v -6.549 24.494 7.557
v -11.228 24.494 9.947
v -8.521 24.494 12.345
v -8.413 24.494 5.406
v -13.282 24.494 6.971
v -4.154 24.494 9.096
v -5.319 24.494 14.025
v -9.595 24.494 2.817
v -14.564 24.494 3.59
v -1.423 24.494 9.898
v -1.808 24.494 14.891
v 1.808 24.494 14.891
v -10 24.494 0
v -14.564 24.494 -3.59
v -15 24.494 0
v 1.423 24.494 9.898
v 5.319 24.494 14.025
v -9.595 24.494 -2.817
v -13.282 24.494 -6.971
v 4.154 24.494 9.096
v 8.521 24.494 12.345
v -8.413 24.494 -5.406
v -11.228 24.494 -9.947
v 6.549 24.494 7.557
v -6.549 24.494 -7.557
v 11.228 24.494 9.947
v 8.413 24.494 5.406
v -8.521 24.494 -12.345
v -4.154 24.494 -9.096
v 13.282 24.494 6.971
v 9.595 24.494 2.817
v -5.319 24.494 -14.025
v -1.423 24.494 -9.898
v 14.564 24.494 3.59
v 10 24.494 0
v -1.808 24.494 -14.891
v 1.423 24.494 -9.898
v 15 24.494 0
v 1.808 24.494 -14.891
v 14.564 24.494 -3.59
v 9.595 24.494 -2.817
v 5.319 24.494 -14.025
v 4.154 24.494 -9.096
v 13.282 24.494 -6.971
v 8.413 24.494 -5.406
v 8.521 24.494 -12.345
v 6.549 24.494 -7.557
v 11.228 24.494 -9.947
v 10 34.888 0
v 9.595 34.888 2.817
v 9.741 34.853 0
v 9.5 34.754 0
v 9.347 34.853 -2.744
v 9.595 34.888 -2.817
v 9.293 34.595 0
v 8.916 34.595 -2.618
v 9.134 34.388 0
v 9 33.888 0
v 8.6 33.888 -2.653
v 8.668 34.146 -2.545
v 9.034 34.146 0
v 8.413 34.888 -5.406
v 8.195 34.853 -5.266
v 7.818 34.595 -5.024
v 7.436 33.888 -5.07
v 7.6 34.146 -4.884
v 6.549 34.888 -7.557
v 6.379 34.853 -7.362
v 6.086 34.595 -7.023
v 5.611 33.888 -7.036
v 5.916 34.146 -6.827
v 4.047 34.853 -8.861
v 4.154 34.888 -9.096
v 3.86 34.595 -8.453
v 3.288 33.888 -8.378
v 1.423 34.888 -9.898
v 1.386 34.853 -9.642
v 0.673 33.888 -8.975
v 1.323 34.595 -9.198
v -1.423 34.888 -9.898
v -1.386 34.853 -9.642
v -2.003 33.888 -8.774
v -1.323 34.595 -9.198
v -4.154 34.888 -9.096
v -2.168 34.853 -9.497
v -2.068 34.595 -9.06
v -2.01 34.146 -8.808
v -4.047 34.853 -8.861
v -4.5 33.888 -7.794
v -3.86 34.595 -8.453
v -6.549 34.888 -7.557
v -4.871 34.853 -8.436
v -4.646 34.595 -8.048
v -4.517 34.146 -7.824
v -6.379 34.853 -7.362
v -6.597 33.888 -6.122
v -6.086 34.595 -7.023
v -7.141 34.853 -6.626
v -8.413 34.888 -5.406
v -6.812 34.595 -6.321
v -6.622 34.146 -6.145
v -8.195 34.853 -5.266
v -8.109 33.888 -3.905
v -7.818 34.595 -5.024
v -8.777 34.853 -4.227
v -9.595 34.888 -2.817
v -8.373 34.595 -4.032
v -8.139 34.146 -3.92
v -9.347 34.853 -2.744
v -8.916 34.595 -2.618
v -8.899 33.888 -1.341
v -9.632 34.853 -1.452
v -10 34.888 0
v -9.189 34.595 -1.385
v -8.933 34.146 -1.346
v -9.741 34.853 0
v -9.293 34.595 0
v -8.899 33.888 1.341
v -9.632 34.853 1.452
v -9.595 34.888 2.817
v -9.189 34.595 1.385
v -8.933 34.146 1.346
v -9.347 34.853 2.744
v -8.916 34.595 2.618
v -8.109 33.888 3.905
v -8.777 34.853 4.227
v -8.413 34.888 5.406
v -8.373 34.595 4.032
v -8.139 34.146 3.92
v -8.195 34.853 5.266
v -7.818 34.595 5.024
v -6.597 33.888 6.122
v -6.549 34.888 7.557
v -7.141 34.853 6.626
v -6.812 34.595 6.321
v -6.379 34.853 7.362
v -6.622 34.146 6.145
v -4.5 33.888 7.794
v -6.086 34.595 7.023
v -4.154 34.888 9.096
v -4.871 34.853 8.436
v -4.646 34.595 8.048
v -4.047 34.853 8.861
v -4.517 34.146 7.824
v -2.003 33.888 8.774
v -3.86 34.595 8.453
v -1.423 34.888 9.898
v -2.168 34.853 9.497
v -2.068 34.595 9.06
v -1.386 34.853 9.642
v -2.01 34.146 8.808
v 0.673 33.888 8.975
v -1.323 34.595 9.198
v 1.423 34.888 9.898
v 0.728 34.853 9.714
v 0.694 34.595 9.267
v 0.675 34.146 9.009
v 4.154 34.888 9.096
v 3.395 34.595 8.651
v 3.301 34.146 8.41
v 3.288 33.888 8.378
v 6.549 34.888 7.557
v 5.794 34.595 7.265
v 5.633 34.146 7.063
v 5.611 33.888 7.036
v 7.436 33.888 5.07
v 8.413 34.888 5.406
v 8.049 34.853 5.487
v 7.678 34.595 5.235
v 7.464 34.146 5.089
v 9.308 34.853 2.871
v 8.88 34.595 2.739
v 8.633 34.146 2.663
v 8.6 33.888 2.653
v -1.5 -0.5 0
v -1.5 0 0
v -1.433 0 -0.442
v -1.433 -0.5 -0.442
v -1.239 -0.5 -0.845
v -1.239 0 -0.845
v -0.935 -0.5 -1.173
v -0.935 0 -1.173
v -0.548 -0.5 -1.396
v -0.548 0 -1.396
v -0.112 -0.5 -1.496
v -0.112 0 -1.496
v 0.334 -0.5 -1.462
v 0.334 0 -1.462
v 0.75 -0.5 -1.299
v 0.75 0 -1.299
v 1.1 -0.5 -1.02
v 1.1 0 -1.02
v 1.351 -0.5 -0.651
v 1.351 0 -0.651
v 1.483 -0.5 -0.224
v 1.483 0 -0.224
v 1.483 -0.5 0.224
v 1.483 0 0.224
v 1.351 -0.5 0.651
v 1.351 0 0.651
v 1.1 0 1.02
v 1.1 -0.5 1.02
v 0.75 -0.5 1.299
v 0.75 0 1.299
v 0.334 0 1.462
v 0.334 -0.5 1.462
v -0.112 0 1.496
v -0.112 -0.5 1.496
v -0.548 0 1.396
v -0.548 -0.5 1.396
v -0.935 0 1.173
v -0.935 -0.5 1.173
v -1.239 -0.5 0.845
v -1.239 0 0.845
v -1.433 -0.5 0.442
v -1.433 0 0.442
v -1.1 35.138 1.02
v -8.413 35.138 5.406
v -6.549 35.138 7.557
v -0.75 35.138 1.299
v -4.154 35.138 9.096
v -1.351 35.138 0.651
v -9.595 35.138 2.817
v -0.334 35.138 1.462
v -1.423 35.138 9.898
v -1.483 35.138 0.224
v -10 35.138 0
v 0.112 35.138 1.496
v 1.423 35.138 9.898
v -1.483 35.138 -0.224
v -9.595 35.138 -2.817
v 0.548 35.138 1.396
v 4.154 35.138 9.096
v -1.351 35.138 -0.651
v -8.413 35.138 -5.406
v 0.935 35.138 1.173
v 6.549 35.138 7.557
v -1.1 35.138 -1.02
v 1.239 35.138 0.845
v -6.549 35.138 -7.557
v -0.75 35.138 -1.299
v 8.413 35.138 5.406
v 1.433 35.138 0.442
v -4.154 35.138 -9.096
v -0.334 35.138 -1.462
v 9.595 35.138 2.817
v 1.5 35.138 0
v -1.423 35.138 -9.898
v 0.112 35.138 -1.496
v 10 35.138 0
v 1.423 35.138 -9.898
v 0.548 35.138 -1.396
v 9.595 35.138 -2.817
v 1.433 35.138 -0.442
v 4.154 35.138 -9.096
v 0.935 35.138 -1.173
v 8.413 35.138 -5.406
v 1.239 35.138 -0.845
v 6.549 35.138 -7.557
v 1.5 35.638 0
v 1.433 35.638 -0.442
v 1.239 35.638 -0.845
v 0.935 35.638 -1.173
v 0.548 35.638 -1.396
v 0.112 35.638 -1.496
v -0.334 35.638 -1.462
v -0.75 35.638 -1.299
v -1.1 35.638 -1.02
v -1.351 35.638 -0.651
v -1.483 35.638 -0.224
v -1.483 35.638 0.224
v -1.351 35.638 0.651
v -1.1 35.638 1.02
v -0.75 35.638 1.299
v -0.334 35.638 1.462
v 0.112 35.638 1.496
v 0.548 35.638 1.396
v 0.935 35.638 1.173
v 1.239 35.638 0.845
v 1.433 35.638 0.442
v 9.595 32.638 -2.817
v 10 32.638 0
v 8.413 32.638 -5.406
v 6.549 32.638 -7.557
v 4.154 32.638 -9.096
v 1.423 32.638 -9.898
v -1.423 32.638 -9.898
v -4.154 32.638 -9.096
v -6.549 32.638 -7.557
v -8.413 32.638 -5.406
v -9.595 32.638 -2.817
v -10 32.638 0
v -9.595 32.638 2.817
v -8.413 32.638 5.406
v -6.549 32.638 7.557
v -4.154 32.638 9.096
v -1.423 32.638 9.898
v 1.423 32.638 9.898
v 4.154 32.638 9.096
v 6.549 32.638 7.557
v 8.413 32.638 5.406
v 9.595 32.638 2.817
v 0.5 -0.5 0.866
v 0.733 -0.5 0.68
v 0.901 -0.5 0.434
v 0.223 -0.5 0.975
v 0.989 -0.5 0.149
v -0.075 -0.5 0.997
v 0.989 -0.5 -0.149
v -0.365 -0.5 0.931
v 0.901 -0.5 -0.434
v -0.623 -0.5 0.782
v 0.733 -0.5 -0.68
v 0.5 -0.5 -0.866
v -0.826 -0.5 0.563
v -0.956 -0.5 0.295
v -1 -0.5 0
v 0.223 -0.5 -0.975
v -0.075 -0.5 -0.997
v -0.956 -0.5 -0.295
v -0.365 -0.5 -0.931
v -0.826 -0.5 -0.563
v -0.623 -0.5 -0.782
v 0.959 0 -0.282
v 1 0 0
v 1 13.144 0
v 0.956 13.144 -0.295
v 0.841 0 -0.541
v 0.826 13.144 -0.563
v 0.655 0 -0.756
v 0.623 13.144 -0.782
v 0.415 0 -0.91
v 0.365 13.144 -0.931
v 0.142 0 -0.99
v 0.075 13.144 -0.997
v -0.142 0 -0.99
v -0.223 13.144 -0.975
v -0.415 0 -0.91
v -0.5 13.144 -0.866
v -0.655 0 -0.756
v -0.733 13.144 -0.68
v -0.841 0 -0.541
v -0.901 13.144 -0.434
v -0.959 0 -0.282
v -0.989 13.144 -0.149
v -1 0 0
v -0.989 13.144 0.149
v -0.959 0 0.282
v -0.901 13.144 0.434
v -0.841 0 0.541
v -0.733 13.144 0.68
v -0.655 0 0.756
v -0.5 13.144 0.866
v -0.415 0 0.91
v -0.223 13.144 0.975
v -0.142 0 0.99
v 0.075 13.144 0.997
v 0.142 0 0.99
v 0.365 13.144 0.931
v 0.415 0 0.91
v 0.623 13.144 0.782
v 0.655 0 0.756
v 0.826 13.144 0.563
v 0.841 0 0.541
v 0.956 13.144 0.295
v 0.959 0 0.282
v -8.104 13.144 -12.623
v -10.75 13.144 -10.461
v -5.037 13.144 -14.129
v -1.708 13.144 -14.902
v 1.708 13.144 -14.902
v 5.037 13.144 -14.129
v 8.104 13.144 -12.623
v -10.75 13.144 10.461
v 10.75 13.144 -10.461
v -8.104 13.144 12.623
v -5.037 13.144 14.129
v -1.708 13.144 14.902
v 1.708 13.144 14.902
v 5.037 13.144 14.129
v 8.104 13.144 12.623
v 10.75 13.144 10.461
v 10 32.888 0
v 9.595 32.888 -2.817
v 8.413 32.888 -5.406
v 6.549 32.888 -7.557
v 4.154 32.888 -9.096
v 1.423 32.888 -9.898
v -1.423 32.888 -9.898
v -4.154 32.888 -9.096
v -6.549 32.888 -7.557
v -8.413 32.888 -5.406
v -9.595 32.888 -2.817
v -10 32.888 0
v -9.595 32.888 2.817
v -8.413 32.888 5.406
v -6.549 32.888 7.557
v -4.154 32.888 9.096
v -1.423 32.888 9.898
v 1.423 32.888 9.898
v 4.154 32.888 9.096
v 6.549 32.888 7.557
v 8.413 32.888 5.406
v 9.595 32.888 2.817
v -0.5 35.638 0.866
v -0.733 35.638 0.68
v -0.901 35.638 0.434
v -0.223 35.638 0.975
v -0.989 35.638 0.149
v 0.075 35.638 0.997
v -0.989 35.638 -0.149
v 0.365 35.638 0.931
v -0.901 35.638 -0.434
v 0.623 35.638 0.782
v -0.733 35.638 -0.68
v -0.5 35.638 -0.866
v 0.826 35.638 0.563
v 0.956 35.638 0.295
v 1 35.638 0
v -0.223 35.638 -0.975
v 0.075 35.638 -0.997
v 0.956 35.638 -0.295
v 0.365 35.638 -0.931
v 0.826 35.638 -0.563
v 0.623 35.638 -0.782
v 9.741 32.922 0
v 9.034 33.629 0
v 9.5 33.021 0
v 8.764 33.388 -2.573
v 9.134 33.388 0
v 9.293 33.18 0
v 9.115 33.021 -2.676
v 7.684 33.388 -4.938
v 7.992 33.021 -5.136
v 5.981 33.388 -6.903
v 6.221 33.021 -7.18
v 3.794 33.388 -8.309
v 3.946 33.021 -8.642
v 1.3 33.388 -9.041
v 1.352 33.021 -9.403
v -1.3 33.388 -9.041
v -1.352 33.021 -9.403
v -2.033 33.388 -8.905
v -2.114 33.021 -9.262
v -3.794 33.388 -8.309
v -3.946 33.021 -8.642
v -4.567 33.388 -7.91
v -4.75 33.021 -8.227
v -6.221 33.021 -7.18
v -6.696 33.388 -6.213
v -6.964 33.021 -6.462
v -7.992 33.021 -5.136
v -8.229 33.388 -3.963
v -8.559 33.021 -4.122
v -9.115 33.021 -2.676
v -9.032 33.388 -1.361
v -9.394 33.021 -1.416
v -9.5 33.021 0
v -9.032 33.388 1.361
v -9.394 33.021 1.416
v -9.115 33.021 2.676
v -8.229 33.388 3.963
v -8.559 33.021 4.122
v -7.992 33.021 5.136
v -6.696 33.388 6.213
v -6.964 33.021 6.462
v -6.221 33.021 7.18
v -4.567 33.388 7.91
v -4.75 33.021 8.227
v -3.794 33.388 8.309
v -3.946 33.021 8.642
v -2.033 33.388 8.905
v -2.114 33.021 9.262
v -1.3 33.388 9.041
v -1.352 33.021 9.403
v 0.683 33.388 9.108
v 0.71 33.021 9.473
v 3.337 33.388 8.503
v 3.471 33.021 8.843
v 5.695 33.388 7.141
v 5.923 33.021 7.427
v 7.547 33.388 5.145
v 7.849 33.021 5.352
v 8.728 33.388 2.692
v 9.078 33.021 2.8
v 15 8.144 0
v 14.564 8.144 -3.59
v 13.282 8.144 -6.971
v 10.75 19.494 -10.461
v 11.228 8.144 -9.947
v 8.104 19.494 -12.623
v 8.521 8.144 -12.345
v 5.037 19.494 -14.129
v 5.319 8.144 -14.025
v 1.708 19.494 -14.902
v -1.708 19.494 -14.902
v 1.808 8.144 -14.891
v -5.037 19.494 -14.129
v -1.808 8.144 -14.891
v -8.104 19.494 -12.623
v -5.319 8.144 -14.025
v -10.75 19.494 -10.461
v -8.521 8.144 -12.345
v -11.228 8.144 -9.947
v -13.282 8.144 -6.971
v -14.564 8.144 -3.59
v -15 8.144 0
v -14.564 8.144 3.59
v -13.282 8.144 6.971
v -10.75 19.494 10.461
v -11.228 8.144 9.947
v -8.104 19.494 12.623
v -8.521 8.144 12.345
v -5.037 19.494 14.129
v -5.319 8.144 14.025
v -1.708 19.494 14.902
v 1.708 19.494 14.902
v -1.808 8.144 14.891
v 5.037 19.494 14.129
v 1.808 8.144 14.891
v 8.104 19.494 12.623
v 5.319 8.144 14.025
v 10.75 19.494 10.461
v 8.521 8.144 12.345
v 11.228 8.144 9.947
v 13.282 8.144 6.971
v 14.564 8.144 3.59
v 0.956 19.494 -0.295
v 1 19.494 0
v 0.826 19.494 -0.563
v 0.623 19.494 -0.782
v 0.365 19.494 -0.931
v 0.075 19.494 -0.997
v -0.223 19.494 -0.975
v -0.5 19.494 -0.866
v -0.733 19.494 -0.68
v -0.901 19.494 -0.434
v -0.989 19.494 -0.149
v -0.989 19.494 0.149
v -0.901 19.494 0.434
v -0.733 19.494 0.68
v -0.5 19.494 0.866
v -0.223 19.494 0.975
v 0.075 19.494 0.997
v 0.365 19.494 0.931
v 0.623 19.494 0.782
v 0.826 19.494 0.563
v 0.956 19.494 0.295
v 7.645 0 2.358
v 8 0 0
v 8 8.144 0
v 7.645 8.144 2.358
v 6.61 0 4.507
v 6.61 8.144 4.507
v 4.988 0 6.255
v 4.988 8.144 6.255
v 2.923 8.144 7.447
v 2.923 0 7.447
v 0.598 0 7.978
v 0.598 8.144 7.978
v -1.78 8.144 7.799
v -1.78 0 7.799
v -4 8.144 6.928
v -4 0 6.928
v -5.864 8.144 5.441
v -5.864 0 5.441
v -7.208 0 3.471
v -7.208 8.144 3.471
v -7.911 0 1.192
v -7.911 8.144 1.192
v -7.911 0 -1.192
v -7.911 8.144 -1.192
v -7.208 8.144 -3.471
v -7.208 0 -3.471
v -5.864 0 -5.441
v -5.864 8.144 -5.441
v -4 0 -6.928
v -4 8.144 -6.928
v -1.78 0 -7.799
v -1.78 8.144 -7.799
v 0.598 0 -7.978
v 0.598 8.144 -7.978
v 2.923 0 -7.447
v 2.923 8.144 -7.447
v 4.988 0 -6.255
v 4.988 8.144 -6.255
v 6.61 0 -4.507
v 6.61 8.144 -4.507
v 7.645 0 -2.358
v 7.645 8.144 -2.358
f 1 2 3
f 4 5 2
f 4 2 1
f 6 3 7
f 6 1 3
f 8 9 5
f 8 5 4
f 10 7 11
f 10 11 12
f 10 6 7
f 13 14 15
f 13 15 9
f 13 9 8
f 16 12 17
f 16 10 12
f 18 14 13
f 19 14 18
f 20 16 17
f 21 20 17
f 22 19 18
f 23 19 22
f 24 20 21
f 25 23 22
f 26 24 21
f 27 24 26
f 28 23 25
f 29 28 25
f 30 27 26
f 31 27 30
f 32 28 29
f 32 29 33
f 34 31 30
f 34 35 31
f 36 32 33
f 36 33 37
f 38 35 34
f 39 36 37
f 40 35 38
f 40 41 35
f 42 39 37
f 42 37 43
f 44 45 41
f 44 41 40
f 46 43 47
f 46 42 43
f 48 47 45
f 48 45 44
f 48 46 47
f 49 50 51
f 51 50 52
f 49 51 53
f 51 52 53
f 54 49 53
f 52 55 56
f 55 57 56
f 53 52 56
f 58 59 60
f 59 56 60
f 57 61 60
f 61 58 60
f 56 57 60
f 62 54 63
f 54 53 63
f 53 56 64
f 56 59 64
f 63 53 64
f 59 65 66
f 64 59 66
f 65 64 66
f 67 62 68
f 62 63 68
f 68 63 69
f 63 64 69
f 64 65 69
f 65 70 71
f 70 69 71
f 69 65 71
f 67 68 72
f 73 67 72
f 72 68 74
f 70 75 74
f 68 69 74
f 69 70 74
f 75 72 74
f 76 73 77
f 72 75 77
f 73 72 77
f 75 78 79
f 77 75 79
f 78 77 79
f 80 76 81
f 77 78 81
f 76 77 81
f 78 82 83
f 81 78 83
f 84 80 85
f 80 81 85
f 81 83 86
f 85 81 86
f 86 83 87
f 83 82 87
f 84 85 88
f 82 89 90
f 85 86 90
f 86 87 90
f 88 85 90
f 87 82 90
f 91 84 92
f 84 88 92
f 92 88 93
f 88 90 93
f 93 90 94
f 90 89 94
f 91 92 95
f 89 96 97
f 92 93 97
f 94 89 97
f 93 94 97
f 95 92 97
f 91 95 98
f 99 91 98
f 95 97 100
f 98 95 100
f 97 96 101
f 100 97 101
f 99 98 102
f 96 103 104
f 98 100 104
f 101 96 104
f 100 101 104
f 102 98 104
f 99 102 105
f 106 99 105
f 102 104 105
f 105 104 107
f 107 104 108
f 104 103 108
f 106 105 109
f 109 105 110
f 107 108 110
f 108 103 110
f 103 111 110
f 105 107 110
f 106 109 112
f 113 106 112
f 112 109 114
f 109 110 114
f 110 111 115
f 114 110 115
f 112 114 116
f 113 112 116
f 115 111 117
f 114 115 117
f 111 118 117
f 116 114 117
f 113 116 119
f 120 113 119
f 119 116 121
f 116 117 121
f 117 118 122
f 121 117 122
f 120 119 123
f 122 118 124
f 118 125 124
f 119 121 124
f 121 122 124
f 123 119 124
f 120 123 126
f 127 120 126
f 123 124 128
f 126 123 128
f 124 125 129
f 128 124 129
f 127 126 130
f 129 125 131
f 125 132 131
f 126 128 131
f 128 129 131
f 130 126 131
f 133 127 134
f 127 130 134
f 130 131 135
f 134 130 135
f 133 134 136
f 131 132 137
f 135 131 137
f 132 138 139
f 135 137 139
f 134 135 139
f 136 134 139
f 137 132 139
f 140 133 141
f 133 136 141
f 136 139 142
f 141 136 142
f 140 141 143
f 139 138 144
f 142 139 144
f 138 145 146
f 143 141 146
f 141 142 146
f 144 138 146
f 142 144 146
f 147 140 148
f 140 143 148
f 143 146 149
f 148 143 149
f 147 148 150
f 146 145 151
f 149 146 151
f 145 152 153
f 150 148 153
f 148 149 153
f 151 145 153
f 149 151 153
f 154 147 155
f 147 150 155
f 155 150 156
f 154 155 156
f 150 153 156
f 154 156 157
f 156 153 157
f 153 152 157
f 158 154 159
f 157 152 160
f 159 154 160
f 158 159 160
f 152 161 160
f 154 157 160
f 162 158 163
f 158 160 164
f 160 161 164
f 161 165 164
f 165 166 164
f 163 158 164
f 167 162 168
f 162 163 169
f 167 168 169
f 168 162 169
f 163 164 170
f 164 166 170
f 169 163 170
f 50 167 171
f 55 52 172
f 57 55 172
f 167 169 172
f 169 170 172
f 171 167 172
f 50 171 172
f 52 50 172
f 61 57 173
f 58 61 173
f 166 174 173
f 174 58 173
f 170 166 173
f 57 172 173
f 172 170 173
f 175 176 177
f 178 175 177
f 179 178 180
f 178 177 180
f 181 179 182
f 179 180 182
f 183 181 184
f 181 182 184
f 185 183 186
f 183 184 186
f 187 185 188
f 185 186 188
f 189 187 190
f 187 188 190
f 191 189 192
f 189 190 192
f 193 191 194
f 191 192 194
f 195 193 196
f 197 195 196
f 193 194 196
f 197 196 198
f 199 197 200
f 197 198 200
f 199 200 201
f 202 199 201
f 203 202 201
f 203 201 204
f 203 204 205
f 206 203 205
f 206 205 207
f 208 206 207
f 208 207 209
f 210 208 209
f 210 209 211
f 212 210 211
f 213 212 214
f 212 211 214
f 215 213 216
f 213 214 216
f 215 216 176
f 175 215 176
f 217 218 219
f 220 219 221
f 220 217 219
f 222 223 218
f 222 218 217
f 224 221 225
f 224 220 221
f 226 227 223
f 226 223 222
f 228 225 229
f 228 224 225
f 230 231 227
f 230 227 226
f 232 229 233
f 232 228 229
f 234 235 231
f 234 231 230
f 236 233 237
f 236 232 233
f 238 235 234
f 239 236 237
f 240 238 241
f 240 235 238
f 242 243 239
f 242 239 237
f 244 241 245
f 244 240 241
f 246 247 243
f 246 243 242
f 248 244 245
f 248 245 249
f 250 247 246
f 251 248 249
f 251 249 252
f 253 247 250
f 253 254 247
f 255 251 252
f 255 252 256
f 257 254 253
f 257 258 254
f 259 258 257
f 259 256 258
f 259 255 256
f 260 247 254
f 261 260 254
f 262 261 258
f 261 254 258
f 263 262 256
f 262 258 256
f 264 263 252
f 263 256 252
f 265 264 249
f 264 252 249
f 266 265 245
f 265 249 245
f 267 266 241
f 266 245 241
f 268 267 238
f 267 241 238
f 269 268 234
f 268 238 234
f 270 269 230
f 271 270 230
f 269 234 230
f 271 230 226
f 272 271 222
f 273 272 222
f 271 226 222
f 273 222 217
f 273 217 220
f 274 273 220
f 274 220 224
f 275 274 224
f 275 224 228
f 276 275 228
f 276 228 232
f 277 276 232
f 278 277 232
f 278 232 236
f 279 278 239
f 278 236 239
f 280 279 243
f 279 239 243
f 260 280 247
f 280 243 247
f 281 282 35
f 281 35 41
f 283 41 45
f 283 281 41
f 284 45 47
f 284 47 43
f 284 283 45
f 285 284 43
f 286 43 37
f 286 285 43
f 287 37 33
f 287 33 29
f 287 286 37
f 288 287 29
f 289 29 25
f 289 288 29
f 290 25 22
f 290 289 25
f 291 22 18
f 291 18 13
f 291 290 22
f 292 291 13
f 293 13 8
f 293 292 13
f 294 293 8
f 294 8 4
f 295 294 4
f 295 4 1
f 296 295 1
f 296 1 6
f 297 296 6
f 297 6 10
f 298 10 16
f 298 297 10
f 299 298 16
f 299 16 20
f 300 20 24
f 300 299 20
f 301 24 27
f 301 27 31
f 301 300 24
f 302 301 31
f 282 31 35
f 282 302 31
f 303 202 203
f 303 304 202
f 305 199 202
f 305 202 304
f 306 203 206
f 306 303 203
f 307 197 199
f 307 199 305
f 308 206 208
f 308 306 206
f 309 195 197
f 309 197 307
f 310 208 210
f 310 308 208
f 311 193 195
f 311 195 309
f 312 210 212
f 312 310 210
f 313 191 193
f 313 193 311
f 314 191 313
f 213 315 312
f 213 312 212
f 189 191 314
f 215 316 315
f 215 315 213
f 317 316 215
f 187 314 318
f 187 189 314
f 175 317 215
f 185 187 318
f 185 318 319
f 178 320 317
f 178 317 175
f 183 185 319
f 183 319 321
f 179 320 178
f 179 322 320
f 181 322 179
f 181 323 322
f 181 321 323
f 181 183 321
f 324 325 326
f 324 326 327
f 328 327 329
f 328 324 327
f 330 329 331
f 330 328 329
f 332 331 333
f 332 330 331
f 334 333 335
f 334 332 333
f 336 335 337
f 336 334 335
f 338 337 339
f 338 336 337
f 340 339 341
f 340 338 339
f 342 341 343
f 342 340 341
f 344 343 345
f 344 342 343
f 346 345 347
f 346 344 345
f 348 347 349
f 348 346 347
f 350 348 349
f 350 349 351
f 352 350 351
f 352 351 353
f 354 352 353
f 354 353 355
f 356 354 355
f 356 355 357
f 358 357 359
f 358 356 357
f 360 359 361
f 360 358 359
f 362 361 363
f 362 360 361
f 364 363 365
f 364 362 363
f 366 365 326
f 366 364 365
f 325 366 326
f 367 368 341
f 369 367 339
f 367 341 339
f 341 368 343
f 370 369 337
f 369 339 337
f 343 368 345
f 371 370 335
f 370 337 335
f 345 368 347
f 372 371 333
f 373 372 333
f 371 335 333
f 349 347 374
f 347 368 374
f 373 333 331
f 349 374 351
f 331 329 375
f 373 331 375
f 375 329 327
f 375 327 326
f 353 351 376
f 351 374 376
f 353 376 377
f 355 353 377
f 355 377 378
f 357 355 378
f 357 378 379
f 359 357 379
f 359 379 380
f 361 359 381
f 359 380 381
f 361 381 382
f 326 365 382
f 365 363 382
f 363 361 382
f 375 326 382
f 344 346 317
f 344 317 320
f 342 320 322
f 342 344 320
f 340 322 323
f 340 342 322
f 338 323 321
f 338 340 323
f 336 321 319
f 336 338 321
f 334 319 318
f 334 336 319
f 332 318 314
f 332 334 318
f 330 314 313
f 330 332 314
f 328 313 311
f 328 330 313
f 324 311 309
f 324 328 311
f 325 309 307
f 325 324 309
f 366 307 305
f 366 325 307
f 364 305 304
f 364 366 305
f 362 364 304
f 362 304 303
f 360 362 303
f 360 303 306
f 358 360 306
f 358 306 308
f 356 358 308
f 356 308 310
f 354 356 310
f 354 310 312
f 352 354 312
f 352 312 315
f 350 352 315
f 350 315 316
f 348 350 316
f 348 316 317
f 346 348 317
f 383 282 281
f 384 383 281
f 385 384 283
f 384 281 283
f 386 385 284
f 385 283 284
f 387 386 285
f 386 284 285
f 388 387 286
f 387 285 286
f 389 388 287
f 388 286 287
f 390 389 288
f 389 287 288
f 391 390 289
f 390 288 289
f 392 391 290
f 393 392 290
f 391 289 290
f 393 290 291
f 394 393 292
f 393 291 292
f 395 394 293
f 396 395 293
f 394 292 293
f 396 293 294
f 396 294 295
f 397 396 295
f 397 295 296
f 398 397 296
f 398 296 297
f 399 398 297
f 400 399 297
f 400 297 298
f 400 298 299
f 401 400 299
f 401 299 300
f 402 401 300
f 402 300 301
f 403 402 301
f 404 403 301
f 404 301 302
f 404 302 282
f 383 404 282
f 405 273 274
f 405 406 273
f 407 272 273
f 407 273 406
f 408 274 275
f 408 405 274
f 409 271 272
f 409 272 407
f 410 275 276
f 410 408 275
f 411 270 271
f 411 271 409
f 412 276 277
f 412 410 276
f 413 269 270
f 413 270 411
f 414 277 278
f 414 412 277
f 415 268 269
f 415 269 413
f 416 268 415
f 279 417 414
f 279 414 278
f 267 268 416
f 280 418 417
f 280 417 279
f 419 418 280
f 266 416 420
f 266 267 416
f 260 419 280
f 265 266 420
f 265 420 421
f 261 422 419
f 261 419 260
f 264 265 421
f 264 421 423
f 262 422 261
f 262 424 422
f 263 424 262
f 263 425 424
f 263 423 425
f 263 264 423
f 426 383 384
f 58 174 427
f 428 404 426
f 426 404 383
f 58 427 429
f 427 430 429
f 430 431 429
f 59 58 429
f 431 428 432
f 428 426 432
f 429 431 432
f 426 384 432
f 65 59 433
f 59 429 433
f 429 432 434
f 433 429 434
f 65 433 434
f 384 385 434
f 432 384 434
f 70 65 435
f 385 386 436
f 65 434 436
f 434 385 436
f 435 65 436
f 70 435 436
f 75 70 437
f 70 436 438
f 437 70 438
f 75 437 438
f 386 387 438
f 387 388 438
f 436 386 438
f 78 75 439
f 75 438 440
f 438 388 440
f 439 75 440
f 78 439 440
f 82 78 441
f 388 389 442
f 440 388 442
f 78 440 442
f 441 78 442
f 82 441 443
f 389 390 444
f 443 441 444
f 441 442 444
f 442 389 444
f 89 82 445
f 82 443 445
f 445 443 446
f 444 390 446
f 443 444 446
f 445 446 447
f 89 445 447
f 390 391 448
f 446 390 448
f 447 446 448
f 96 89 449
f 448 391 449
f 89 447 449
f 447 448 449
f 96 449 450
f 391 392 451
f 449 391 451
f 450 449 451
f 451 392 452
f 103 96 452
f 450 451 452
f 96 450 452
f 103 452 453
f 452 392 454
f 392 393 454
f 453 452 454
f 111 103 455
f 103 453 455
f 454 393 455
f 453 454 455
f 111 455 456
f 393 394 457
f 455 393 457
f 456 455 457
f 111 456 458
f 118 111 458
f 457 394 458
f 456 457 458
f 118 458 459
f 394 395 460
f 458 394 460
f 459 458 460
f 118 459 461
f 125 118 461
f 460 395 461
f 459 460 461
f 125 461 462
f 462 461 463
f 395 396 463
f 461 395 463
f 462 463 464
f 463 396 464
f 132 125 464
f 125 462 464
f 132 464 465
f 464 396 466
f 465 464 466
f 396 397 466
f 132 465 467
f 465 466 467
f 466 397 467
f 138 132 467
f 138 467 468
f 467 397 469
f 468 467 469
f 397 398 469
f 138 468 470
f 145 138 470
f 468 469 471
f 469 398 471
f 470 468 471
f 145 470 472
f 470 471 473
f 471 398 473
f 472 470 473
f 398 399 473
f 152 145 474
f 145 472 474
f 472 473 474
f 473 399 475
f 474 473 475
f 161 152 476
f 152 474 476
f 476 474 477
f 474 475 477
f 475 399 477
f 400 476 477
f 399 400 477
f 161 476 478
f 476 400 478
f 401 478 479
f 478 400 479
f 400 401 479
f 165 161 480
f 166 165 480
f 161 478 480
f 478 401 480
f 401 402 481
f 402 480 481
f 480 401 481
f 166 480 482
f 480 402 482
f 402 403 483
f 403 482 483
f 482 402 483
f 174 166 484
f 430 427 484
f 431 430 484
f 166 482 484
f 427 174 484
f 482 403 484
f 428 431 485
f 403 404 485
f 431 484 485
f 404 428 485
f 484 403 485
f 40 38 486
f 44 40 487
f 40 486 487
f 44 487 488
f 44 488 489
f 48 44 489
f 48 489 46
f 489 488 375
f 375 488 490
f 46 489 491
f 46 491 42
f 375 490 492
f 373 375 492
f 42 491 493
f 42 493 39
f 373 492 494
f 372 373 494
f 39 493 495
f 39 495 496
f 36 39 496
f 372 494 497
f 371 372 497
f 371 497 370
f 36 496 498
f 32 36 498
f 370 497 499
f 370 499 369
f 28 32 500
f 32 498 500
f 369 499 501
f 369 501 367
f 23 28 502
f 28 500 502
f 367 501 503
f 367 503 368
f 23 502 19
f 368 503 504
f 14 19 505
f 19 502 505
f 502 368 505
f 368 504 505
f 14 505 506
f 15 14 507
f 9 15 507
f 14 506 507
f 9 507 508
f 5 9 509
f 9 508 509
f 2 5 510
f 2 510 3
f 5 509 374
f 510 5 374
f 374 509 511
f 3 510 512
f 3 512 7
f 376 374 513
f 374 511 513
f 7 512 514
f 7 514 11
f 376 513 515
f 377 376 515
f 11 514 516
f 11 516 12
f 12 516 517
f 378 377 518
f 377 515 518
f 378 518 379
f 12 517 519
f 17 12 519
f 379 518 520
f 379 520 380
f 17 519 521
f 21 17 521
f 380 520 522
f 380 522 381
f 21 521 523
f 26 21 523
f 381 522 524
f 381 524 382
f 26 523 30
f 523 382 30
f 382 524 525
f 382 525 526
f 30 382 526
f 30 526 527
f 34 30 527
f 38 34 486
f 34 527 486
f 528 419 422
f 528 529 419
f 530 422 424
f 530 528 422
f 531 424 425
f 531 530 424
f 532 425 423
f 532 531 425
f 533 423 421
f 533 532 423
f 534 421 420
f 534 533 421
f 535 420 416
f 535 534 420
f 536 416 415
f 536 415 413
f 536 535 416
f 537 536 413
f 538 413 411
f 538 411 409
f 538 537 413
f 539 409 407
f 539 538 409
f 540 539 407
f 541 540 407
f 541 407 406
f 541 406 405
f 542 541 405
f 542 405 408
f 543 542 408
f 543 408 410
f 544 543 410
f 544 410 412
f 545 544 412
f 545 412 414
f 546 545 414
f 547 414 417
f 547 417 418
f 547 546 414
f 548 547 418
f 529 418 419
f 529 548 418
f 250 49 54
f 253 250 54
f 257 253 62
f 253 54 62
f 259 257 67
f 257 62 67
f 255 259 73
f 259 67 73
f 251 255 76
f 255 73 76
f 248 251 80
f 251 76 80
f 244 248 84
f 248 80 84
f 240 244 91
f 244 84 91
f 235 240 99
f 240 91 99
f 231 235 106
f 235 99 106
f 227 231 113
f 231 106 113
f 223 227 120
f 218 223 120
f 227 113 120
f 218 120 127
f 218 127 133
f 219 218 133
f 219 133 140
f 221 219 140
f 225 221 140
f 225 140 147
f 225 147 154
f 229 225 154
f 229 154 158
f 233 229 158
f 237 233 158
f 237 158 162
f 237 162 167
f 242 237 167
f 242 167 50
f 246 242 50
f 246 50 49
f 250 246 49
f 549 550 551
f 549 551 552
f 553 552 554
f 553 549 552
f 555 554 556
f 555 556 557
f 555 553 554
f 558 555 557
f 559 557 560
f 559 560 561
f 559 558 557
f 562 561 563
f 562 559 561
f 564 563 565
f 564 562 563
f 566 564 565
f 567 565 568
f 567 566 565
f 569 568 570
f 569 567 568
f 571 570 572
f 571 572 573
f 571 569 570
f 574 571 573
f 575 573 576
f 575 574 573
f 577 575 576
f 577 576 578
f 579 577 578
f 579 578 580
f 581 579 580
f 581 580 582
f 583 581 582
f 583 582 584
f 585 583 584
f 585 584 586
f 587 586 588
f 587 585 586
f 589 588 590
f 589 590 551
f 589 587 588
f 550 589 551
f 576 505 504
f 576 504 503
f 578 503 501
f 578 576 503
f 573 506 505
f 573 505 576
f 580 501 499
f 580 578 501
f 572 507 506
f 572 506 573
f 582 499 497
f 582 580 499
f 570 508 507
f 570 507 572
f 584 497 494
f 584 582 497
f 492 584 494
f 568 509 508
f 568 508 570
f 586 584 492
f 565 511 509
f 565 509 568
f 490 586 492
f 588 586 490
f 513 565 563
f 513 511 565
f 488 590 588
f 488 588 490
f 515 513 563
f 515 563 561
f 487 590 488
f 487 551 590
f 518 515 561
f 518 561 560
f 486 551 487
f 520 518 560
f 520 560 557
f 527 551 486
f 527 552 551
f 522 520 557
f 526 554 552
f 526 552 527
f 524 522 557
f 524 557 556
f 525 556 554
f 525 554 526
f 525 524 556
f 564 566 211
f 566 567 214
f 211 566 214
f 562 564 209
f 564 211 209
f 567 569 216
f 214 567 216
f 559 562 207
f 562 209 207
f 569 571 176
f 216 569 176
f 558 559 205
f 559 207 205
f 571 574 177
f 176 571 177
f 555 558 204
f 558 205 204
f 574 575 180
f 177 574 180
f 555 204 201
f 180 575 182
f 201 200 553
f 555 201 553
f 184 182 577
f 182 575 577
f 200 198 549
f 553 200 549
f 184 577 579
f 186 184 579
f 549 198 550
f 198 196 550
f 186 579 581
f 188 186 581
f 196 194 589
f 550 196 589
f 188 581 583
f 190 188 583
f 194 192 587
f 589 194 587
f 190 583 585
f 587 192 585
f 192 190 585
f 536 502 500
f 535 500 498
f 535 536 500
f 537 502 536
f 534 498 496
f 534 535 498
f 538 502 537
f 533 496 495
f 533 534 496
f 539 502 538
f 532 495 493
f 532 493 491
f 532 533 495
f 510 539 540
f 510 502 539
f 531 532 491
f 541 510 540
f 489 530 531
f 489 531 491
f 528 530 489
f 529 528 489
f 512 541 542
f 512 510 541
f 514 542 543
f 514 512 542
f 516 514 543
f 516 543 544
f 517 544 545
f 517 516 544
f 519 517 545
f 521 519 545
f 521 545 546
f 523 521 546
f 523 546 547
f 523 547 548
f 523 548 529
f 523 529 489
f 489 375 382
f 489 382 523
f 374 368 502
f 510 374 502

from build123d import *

# Parameters (mm, degrees)
SKETCH1_R               = 15
SKETCH1_R_2             = 1
BOSS_EXTRUDE1_DEPTH     = 32.6375
SKETCH2_W               = 21.5
SKETCH2_H               = 6.35
CUT_EXTRUDE1_DEPTH      = 16
CUT_EXTRUDE1_DEPTH_BACK = 16
SKETCH3_R               = 1.5
SKETCH3_R_2             = 1
BOSS_EXTRUDE2_DEPTH     = 0.5
SKETCH4_R               = 10
SKETCH4_R_2             = 1
BOSS_EXTRUDE3_DEPTH     = 2.5
CUT_SWEEP2_PROFILE_R    = 1
SKETCH82_R              = 1.5
SKETCH82_R_2            = 1
BOSS_EXTRUDE5_DEPTH     = 0.5
SKETCH91_R              = 15
SKETCH91_R_2            = 8
CUT_EXTRUDE2_DEPTH      = 1.5
CUT_EXTRUDE2_DEPTH_BACK = 8.14375
SKETCH92_R              = 15
SKETCH92_R_2            = 10
CUT_EXTRUDE3_DEPTH      = 8.14375


with BuildPart() as part:
    # Sketch1 → Boss-Extrude1 (new body)
    with BuildSketch(Plane(origin=(0, 0, 0), x_dir=(1, 0, 0), z_dir=(0, 1, 0))):
        Circle(SKETCH1_R)
        Circle(SKETCH1_R_2, mode=Mode.SUBTRACT)
    extrude(amount=BOSS_EXTRUDE1_DEPTH)

    # Sketch2 → Cut-Extrude1 (cut, two sides)
    with BuildSketch(Plane.XY) as cut_extrude1_sk:
        with Locations((0, 16.31875)):
            Rectangle(SKETCH2_W, SKETCH2_H)
    extrude(amount=CUT_EXTRUDE1_DEPTH, mode=Mode.SUBTRACT)
    extrude(cut_extrude1_sk.sketch, amount=-CUT_EXTRUDE1_DEPTH_BACK, mode=Mode.SUBTRACT)

    # Sketch3 → Boss-Extrude2 (add)
    with BuildSketch(Plane(origin=(0, 0, 0), x_dir=(-1, 0, 0), z_dir=(0, -1, 0))):
        Circle(SKETCH3_R)
        Circle(SKETCH3_R_2, mode=Mode.SUBTRACT)
    extrude(amount=BOSS_EXTRUDE2_DEPTH)

    # Sketch4 → Boss-Extrude3 (add)
    with BuildSketch(Plane(origin=(0, 32.6375, 0), x_dir=(1, 0, 0), z_dir=(0, 1, 0))):
        Circle(SKETCH4_R)
        Circle(SKETCH4_R_2, mode=Mode.SUBTRACT)
    extrude(amount=BOSS_EXTRUDE3_DEPTH)

    # Cut-Sweep2: sweep along a path in Sketch77
    with BuildLine(Plane(origin=(0, 33.8875, 0), x_dir=(1, 0, 0), z_dir=(0, 1, 0))) as cut_sweep2_path:
        CenterArc((0, 0), 10, 0, 360)
    # Cut-Sweep2 profile (on start of the path) → Cut-Sweep2 (sweep, cut)
    with BuildSketch(Plane(origin=(10, 33.8875, 0), x_dir=(-1, 0, 0), z_dir=(0, 0, -1))):
        Circle(CUT_SWEEP2_PROFILE_R)
    sweep(path=cut_sweep2_path.line, mode=Mode.SUBTRACT)

    # Sketch82 → Boss-Extrude5 (add)
    with BuildSketch(Plane(origin=(0, 35.1375, 0), x_dir=(1, 0, 0), z_dir=(0, 1, 0))):
        Circle(SKETCH82_R)
        Circle(SKETCH82_R_2, mode=Mode.SUBTRACT)
    extrude(amount=BOSS_EXTRUDE5_DEPTH)

    # Sketch91 → Cut-Extrude2 (cut, two sides)
    with BuildSketch(Plane.XZ) as cut_extrude2_sk:
        Circle(SKETCH91_R)
        Circle(SKETCH91_R_2, mode=Mode.SUBTRACT)
    extrude(amount=CUT_EXTRUDE2_DEPTH, mode=Mode.SUBTRACT)
    extrude(cut_extrude2_sk.sketch, amount=-CUT_EXTRUDE2_DEPTH_BACK, mode=Mode.SUBTRACT)

    # Sketch92 → Cut-Extrude3 (cut)
    with BuildSketch(Plane(origin=(0, 32.6375, 0), x_dir=(1, 0, 0), z_dir=(0, 1, 0))):
        Circle(SKETCH92_R)
        Circle(SKETCH92_R_2, mode=Mode.SUBTRACT)
    extrude(amount=-CUT_EXTRUDE3_DEPTH, mode=Mode.SUBTRACT)


solid = part.part
